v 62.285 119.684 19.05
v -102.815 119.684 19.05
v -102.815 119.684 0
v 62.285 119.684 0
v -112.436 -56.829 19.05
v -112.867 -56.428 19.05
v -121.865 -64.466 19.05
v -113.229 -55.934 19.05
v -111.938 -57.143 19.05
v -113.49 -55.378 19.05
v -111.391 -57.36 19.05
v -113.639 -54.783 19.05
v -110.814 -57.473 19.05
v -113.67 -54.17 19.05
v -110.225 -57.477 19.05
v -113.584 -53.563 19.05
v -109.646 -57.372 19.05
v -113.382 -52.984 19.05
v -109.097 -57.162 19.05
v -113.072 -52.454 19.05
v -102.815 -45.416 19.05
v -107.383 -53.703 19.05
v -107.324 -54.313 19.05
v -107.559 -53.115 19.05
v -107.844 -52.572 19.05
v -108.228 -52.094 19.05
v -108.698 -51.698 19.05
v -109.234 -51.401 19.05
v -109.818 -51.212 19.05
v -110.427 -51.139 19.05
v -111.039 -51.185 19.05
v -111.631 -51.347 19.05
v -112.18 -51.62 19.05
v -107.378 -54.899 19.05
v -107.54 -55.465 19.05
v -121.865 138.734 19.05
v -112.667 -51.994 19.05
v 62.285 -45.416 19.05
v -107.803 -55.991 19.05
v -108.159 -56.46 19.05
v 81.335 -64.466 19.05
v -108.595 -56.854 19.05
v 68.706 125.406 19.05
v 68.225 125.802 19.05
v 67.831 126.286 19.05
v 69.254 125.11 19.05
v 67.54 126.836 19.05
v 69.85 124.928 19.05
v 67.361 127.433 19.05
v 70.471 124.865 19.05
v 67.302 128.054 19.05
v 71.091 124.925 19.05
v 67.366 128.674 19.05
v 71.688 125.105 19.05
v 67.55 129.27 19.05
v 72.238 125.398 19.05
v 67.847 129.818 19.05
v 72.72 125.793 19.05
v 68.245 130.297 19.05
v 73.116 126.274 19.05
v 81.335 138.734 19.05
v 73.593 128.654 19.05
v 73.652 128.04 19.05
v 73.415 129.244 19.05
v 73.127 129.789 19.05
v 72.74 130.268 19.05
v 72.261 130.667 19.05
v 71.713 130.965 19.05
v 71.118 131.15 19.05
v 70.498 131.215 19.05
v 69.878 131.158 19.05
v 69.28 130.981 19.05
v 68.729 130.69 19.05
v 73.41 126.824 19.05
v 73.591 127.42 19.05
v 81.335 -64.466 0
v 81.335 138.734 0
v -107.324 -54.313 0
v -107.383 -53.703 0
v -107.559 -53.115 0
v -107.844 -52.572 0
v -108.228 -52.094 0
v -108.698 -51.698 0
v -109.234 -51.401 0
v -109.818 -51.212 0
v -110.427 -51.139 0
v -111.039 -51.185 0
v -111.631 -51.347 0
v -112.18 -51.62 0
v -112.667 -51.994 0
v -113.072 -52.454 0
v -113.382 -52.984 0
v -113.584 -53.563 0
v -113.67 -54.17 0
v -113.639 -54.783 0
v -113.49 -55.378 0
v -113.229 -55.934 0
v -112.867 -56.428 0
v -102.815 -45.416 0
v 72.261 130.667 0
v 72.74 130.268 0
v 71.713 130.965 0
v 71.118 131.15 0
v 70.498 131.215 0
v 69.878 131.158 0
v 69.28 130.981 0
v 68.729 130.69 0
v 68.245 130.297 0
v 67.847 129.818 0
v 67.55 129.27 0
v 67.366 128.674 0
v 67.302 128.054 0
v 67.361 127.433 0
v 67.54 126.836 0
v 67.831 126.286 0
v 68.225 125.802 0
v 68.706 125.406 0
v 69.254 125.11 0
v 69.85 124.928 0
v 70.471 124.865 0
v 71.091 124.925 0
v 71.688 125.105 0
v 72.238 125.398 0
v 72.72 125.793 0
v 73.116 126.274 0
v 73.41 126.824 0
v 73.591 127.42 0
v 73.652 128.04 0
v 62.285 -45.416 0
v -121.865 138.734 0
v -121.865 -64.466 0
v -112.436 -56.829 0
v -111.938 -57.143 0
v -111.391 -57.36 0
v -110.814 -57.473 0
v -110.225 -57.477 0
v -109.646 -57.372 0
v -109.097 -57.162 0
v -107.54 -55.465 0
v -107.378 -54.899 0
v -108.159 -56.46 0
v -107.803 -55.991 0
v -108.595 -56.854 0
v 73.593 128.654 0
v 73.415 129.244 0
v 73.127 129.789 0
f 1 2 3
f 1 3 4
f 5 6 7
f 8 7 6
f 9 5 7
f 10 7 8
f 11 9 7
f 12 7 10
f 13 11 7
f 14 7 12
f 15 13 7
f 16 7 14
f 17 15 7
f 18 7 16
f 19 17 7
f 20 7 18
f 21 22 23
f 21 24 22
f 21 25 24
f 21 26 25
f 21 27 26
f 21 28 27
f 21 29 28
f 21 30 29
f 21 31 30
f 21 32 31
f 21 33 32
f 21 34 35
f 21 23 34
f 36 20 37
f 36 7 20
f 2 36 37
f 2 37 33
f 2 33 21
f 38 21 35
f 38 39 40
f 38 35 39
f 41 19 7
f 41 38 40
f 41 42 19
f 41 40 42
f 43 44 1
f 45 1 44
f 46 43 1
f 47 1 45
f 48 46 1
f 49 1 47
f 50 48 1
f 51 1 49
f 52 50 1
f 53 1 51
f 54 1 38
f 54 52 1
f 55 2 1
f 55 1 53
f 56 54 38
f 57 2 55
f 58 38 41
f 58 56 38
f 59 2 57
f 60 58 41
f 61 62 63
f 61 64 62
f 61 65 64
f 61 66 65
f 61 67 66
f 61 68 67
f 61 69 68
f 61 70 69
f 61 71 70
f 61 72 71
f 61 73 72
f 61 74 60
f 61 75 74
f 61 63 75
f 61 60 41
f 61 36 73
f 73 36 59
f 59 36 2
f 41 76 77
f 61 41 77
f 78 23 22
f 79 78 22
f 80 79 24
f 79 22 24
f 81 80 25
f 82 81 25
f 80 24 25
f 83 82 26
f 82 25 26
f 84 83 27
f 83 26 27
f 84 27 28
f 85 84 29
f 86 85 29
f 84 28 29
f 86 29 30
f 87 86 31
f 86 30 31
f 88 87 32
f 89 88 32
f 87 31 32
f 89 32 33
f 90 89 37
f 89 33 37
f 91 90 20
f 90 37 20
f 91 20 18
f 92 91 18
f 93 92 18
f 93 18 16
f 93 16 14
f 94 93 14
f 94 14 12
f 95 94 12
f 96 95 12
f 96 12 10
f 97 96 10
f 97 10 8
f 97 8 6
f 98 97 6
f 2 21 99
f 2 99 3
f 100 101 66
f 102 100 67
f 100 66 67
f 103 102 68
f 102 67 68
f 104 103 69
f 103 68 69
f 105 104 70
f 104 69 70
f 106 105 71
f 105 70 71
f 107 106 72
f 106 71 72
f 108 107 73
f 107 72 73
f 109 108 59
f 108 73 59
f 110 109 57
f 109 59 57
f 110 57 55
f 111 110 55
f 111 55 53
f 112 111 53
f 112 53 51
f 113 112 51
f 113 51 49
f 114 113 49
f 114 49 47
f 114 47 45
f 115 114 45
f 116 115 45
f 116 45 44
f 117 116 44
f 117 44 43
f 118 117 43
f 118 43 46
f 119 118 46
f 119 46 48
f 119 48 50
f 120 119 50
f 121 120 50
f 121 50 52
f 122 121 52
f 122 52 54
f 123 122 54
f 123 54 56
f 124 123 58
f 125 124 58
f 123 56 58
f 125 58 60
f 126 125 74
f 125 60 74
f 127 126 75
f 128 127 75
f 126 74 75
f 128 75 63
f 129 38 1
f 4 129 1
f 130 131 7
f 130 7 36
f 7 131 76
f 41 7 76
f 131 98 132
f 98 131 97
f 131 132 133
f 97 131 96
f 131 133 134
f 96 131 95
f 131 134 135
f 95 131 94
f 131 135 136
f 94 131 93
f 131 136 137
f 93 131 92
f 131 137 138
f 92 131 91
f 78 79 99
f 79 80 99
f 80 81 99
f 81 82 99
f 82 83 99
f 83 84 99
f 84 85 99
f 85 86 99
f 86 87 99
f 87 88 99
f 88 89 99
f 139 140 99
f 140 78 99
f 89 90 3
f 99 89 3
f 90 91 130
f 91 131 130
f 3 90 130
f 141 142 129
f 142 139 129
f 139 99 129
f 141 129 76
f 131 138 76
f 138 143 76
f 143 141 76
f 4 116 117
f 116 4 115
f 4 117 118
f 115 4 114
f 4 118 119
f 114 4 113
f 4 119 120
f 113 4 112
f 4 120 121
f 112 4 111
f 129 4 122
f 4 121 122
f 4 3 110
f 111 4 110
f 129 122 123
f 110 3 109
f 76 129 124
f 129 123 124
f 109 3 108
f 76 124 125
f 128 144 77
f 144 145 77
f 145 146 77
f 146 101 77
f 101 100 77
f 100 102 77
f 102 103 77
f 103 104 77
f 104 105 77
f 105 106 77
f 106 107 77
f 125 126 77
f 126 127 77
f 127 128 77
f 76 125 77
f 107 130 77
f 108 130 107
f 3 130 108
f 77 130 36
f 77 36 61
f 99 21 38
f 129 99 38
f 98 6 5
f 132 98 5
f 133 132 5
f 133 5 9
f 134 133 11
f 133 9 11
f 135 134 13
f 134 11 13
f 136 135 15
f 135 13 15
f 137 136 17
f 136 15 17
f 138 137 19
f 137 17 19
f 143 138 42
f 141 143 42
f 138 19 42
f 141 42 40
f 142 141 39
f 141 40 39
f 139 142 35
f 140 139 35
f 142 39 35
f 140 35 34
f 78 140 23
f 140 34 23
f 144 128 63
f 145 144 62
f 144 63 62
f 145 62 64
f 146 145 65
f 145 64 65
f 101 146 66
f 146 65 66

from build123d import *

# Parameters (mm, degrees)
F0_W     = 203.2
F0_H     = 203.2
F1_DEPTH = 19.05
F2_W     = 165.1
F2_H     = 165.1
F3_DEPTH = 19.051
F5_DEPTH = 19.051


with BuildPart() as f1:
    # F0 (on Top) → F1 (new body)
    with BuildSketch(Plane.XY):
        with Locations((-20.2645299196, 37.1341121554)):
            Rectangle(F0_W, F0_H)
    extrude(amount=F1_DEPTH)

    # F2 (on face) → F3 (cut, through all)
    with BuildSketch(Plane.XY.offset(19.05)):
        with Locations((-20.2645299196, 37.1341121554)):
            Rectangle(F2_W, F2_H)
    extrude(amount=-F3_DEPTH, mode=Mode.SUBTRACT)

    # F4 (on face) → F5 (cut, through all)
    with BuildSketch(Plane.XY.offset(19.05)):
        with BuildLine():
            ThreePointArc((-107.3236708058, -54.3133095216), (-111.6306122296, -51.3469424483), (-112.8665581212, -56.4284300055))
            ThreePointArc((-112.8665581212, -56.4284300055), (-109.366729382, -57.2796765948), (-107.3236708058, -54.3133095216))
        make_face()
        with BuildLine():
            ThreePointArc((73.6524293098, 128.0401629025), (73.4153509009, 129.2440074624), (72.739521137, 130.2680689969))
            ThreePointArc((72.739521137, 130.2680689969), (67.5395077186, 126.8363183426), (73.6524293098, 128.0401629025))
        make_face()
    extrude(amount=-F5_DEPTH, mode=Mode.SUBTRACT)


solid = f1.part
